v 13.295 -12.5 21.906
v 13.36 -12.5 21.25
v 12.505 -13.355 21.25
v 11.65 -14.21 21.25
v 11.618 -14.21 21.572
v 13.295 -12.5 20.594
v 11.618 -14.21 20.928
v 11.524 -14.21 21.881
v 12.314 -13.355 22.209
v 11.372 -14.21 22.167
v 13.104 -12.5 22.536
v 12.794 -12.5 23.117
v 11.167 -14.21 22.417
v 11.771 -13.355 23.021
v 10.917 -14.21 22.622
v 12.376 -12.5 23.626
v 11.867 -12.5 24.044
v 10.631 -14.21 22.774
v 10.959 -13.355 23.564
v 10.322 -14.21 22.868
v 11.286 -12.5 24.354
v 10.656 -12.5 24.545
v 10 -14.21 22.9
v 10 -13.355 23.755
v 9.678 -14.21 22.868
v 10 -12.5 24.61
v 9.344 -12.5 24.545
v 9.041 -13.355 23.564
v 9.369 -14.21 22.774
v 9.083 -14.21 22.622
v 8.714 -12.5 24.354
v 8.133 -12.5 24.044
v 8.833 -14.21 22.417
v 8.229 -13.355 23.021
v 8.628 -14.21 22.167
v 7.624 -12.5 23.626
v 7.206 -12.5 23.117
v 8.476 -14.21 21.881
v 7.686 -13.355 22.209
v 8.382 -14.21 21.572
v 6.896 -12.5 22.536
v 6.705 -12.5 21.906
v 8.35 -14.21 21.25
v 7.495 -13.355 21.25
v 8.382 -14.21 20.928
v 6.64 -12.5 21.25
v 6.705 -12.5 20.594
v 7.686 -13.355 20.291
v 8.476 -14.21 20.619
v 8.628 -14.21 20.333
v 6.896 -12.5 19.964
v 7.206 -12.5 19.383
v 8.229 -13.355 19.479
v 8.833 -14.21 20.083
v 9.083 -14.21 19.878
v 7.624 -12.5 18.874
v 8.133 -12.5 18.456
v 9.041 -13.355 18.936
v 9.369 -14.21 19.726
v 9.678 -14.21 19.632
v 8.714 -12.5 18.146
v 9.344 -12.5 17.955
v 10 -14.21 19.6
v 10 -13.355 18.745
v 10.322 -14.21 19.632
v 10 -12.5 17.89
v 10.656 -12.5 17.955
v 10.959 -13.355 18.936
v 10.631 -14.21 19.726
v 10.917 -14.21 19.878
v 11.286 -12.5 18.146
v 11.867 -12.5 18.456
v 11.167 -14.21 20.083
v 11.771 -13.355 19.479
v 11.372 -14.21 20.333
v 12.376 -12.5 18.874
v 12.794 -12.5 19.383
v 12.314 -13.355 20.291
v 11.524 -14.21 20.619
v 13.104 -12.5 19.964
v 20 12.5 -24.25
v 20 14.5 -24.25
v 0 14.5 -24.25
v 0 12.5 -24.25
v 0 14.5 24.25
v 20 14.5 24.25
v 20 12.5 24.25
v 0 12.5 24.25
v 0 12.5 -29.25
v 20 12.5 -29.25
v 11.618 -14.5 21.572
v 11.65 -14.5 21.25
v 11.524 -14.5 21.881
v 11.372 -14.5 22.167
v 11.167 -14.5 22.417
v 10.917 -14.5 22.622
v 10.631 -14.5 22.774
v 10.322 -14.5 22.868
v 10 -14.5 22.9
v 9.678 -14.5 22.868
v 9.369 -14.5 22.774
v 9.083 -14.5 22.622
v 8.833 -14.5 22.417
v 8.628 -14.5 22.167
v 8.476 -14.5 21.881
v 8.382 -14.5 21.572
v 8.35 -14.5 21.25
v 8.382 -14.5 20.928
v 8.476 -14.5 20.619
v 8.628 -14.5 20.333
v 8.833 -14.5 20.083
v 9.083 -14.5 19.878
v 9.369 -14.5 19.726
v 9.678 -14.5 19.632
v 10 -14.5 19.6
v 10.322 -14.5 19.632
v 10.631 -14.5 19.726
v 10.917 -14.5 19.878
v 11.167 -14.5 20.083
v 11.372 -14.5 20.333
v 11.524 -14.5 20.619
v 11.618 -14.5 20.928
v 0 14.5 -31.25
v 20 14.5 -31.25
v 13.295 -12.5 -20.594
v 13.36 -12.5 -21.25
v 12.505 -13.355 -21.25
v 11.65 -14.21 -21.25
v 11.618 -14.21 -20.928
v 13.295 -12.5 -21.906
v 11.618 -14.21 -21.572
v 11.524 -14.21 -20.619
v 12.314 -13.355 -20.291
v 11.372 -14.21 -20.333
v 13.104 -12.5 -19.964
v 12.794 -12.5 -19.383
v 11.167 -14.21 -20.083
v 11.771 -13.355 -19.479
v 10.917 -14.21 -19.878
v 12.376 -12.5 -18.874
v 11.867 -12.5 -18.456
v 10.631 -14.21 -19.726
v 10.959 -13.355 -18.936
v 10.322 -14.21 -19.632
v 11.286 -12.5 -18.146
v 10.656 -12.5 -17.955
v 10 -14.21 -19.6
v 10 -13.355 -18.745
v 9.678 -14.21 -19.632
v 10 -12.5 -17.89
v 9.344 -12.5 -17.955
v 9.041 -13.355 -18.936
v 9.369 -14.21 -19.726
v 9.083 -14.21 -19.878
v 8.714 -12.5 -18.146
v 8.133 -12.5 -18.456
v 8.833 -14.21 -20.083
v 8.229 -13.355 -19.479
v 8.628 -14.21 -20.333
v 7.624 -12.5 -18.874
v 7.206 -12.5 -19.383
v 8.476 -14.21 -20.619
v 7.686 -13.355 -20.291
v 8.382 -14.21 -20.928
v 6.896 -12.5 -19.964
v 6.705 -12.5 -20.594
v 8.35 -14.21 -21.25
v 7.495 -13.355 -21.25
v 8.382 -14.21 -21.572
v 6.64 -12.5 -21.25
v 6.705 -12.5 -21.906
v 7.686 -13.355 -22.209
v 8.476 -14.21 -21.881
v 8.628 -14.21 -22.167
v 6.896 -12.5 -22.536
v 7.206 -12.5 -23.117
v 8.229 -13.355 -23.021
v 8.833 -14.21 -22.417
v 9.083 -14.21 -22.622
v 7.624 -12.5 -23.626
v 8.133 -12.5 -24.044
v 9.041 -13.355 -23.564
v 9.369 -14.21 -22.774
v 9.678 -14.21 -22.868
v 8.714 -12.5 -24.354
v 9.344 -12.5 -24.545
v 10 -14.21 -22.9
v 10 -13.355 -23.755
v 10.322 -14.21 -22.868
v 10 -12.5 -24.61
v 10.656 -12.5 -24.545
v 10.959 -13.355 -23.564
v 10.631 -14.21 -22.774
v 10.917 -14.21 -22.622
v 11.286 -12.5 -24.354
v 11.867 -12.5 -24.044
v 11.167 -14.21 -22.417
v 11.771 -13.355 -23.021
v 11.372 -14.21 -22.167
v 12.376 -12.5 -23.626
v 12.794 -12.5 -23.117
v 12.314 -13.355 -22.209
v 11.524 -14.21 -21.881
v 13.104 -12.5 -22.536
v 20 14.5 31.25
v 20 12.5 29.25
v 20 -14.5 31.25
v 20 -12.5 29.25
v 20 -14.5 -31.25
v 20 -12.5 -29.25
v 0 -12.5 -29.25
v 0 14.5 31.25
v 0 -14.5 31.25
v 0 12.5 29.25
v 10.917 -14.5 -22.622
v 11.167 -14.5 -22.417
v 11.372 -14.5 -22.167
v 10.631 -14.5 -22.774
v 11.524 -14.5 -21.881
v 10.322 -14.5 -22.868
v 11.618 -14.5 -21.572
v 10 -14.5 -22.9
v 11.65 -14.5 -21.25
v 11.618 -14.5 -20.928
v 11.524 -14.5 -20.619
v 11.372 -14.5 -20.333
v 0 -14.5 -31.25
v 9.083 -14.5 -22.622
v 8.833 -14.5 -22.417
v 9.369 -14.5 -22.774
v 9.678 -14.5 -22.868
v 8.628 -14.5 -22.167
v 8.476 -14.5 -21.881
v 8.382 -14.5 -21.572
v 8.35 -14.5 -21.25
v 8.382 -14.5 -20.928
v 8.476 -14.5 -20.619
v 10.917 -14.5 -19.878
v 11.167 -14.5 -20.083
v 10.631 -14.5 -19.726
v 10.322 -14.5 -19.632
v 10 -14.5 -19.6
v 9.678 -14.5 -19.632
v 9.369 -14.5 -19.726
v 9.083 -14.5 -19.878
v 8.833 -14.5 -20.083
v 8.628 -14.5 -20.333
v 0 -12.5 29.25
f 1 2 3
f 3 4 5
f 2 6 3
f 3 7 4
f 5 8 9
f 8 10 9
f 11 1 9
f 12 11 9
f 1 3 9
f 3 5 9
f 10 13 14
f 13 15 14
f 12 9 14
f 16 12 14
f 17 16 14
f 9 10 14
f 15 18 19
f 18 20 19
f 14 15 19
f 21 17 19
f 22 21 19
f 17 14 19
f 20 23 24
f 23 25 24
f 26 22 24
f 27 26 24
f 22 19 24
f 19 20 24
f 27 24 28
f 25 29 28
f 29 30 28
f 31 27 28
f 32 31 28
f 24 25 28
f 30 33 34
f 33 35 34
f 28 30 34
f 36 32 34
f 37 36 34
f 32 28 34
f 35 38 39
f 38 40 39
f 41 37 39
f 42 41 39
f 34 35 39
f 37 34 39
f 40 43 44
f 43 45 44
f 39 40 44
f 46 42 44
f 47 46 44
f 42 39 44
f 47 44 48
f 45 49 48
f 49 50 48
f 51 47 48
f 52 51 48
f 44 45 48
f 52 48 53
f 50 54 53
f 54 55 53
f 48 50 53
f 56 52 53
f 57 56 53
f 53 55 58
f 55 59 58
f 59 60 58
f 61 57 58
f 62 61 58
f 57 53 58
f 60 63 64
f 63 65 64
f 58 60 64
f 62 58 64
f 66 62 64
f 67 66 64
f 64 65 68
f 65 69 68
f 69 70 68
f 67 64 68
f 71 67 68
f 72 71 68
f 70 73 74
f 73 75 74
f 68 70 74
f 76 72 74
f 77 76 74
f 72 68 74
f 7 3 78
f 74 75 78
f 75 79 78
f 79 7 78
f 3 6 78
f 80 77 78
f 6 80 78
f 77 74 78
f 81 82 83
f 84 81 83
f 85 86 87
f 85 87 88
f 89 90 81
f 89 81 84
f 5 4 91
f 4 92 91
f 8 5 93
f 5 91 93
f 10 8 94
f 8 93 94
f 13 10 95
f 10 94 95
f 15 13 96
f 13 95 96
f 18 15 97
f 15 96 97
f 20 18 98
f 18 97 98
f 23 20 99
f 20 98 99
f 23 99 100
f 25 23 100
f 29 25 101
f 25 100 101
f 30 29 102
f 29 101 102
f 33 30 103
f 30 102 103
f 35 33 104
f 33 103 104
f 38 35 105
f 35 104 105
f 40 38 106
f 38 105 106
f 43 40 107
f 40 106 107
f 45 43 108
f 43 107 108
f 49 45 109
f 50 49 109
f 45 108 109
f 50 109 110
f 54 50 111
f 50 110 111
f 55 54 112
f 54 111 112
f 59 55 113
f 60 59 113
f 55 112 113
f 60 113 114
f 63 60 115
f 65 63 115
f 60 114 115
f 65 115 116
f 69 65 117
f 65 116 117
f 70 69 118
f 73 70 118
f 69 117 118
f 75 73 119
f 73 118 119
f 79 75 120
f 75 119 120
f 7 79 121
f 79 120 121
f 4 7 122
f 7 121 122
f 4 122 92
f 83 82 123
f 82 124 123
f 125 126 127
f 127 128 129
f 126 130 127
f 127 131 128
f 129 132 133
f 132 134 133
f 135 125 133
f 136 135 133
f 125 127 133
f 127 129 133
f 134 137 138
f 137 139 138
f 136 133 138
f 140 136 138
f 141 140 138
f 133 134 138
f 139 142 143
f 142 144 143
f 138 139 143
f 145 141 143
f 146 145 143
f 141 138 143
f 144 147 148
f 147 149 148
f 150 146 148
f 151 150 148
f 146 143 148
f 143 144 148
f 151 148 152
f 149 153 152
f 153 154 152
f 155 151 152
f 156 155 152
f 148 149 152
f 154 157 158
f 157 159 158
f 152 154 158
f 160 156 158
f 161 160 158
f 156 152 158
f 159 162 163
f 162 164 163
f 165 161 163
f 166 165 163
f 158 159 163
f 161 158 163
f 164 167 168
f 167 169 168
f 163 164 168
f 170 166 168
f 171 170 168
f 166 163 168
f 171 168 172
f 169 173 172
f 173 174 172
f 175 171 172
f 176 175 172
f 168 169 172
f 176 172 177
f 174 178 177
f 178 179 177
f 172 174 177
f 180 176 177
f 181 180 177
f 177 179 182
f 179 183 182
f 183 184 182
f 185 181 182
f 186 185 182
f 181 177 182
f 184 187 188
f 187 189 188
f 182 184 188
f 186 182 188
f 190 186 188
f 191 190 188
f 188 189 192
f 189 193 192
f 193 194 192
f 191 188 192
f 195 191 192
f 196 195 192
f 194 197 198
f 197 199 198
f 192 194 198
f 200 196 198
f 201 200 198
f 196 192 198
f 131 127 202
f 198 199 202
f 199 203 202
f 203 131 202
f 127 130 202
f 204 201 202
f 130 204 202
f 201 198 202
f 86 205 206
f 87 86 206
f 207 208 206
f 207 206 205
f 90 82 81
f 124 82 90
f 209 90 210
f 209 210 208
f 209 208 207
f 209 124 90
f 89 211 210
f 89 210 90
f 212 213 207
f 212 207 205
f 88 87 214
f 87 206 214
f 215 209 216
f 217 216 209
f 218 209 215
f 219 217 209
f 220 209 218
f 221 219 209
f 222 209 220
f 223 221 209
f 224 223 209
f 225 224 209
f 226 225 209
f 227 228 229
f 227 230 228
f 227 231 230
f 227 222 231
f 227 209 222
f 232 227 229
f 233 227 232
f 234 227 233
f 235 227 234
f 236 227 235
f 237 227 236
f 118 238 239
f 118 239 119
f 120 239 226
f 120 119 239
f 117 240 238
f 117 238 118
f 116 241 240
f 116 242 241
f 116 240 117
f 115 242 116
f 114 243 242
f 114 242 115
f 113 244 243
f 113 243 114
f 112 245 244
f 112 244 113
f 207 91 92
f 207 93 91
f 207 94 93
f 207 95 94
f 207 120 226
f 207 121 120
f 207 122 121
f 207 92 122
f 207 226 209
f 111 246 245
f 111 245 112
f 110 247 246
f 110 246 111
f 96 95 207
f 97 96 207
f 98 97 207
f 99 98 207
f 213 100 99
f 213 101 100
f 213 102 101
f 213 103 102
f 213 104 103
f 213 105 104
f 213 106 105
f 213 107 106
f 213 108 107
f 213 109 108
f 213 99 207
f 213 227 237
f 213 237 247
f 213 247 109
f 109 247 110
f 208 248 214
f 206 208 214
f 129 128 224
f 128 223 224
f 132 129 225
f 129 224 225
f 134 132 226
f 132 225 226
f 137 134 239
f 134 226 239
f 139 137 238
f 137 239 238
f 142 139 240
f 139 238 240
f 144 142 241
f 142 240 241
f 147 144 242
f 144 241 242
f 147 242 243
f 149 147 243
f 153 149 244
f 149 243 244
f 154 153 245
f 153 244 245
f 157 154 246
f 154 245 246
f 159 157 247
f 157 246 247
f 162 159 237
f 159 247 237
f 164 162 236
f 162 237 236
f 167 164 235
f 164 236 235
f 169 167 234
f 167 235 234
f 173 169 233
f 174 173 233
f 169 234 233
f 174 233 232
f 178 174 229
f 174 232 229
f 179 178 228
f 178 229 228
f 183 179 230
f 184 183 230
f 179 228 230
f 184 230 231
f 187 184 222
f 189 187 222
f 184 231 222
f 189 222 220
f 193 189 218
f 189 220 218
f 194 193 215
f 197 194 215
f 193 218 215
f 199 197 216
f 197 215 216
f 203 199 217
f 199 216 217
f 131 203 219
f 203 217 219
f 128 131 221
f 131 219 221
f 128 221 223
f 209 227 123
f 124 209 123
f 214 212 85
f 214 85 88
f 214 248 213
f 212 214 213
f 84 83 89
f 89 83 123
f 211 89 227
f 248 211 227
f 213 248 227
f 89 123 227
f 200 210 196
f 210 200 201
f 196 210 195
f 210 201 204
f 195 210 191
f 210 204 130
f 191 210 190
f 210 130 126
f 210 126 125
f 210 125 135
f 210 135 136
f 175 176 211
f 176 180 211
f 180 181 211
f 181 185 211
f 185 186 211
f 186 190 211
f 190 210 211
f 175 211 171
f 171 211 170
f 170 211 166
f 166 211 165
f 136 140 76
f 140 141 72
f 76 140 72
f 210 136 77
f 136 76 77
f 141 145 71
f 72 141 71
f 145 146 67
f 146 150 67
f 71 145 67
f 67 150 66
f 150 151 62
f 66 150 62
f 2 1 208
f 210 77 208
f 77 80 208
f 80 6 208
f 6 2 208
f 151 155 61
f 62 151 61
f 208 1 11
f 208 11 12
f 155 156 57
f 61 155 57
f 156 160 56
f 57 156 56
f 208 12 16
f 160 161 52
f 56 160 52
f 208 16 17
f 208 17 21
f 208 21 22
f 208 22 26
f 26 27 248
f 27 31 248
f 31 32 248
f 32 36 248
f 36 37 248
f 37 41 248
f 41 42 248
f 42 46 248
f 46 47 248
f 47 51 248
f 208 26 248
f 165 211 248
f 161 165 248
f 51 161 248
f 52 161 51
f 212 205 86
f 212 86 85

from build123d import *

# Parameters (mm, degrees)
F0_W           = 29
F0_H           = 62.5
F0_W_2         = 25
F0_H_2         = 58.5
F1_DEPTH       = 20
F2_W           = 20
F2_H           = 52.5
F3_DEPTH       = 2
F5_D           = 3.3
F5_CSINK_D     = 6.72
F5_CSINK_ANGLE = 90
F6_DEPTH       = 2
F7_DEPTH       = 2


with BuildPart() as f1:
    # F0 (on Right) → F1 (new body)
    with BuildSketch(Plane.YZ):
        Rectangle(F0_W, F0_H)
        Rectangle(F0_W_2, F0_H_2, mode=Mode.SUBTRACT)
    extrude(amount=F1_DEPTH)

    # F2 (on face) → F3 (cut)
    with BuildSketch(Plane(origin=(0, 14.5, 0), x_dir=(-1, 0, 0), z_dir=(0, 1, 0))):
        with Locations((-10, 0)):
            Rectangle(F2_W, F2_H)
    extrude(amount=-F3_DEPTH, mode=Mode.SUBTRACT)

    # F5 (through all)
    with Locations(Plane(origin=(0, -12.5, 0), x_dir=(-1, 0, 0), z_dir=(0, 1, 0))):
        with Locations((-10, 21.25), (-10, -21.25)):
            CounterSinkHole(F5_D / 2, F5_CSINK_D / 2, counter_sink_angle=F5_CSINK_ANGLE)

    # F6 (add): a face of the model
    f6_faces = [f1.faces().sort_by_distance(p)[0] for p in [
        (10, 13.5, 26.25),
    ]]
    extrude(f6_faces, amount=F6_DEPTH)

    # F7 (add): a face of the model
    f7_faces = [f1.faces().sort_by_distance(p)[0] for p in [
        (10, 13.5, -26.25),
    ]]
    extrude(f7_faces, amount=F7_DEPTH)


solid = f1.part
